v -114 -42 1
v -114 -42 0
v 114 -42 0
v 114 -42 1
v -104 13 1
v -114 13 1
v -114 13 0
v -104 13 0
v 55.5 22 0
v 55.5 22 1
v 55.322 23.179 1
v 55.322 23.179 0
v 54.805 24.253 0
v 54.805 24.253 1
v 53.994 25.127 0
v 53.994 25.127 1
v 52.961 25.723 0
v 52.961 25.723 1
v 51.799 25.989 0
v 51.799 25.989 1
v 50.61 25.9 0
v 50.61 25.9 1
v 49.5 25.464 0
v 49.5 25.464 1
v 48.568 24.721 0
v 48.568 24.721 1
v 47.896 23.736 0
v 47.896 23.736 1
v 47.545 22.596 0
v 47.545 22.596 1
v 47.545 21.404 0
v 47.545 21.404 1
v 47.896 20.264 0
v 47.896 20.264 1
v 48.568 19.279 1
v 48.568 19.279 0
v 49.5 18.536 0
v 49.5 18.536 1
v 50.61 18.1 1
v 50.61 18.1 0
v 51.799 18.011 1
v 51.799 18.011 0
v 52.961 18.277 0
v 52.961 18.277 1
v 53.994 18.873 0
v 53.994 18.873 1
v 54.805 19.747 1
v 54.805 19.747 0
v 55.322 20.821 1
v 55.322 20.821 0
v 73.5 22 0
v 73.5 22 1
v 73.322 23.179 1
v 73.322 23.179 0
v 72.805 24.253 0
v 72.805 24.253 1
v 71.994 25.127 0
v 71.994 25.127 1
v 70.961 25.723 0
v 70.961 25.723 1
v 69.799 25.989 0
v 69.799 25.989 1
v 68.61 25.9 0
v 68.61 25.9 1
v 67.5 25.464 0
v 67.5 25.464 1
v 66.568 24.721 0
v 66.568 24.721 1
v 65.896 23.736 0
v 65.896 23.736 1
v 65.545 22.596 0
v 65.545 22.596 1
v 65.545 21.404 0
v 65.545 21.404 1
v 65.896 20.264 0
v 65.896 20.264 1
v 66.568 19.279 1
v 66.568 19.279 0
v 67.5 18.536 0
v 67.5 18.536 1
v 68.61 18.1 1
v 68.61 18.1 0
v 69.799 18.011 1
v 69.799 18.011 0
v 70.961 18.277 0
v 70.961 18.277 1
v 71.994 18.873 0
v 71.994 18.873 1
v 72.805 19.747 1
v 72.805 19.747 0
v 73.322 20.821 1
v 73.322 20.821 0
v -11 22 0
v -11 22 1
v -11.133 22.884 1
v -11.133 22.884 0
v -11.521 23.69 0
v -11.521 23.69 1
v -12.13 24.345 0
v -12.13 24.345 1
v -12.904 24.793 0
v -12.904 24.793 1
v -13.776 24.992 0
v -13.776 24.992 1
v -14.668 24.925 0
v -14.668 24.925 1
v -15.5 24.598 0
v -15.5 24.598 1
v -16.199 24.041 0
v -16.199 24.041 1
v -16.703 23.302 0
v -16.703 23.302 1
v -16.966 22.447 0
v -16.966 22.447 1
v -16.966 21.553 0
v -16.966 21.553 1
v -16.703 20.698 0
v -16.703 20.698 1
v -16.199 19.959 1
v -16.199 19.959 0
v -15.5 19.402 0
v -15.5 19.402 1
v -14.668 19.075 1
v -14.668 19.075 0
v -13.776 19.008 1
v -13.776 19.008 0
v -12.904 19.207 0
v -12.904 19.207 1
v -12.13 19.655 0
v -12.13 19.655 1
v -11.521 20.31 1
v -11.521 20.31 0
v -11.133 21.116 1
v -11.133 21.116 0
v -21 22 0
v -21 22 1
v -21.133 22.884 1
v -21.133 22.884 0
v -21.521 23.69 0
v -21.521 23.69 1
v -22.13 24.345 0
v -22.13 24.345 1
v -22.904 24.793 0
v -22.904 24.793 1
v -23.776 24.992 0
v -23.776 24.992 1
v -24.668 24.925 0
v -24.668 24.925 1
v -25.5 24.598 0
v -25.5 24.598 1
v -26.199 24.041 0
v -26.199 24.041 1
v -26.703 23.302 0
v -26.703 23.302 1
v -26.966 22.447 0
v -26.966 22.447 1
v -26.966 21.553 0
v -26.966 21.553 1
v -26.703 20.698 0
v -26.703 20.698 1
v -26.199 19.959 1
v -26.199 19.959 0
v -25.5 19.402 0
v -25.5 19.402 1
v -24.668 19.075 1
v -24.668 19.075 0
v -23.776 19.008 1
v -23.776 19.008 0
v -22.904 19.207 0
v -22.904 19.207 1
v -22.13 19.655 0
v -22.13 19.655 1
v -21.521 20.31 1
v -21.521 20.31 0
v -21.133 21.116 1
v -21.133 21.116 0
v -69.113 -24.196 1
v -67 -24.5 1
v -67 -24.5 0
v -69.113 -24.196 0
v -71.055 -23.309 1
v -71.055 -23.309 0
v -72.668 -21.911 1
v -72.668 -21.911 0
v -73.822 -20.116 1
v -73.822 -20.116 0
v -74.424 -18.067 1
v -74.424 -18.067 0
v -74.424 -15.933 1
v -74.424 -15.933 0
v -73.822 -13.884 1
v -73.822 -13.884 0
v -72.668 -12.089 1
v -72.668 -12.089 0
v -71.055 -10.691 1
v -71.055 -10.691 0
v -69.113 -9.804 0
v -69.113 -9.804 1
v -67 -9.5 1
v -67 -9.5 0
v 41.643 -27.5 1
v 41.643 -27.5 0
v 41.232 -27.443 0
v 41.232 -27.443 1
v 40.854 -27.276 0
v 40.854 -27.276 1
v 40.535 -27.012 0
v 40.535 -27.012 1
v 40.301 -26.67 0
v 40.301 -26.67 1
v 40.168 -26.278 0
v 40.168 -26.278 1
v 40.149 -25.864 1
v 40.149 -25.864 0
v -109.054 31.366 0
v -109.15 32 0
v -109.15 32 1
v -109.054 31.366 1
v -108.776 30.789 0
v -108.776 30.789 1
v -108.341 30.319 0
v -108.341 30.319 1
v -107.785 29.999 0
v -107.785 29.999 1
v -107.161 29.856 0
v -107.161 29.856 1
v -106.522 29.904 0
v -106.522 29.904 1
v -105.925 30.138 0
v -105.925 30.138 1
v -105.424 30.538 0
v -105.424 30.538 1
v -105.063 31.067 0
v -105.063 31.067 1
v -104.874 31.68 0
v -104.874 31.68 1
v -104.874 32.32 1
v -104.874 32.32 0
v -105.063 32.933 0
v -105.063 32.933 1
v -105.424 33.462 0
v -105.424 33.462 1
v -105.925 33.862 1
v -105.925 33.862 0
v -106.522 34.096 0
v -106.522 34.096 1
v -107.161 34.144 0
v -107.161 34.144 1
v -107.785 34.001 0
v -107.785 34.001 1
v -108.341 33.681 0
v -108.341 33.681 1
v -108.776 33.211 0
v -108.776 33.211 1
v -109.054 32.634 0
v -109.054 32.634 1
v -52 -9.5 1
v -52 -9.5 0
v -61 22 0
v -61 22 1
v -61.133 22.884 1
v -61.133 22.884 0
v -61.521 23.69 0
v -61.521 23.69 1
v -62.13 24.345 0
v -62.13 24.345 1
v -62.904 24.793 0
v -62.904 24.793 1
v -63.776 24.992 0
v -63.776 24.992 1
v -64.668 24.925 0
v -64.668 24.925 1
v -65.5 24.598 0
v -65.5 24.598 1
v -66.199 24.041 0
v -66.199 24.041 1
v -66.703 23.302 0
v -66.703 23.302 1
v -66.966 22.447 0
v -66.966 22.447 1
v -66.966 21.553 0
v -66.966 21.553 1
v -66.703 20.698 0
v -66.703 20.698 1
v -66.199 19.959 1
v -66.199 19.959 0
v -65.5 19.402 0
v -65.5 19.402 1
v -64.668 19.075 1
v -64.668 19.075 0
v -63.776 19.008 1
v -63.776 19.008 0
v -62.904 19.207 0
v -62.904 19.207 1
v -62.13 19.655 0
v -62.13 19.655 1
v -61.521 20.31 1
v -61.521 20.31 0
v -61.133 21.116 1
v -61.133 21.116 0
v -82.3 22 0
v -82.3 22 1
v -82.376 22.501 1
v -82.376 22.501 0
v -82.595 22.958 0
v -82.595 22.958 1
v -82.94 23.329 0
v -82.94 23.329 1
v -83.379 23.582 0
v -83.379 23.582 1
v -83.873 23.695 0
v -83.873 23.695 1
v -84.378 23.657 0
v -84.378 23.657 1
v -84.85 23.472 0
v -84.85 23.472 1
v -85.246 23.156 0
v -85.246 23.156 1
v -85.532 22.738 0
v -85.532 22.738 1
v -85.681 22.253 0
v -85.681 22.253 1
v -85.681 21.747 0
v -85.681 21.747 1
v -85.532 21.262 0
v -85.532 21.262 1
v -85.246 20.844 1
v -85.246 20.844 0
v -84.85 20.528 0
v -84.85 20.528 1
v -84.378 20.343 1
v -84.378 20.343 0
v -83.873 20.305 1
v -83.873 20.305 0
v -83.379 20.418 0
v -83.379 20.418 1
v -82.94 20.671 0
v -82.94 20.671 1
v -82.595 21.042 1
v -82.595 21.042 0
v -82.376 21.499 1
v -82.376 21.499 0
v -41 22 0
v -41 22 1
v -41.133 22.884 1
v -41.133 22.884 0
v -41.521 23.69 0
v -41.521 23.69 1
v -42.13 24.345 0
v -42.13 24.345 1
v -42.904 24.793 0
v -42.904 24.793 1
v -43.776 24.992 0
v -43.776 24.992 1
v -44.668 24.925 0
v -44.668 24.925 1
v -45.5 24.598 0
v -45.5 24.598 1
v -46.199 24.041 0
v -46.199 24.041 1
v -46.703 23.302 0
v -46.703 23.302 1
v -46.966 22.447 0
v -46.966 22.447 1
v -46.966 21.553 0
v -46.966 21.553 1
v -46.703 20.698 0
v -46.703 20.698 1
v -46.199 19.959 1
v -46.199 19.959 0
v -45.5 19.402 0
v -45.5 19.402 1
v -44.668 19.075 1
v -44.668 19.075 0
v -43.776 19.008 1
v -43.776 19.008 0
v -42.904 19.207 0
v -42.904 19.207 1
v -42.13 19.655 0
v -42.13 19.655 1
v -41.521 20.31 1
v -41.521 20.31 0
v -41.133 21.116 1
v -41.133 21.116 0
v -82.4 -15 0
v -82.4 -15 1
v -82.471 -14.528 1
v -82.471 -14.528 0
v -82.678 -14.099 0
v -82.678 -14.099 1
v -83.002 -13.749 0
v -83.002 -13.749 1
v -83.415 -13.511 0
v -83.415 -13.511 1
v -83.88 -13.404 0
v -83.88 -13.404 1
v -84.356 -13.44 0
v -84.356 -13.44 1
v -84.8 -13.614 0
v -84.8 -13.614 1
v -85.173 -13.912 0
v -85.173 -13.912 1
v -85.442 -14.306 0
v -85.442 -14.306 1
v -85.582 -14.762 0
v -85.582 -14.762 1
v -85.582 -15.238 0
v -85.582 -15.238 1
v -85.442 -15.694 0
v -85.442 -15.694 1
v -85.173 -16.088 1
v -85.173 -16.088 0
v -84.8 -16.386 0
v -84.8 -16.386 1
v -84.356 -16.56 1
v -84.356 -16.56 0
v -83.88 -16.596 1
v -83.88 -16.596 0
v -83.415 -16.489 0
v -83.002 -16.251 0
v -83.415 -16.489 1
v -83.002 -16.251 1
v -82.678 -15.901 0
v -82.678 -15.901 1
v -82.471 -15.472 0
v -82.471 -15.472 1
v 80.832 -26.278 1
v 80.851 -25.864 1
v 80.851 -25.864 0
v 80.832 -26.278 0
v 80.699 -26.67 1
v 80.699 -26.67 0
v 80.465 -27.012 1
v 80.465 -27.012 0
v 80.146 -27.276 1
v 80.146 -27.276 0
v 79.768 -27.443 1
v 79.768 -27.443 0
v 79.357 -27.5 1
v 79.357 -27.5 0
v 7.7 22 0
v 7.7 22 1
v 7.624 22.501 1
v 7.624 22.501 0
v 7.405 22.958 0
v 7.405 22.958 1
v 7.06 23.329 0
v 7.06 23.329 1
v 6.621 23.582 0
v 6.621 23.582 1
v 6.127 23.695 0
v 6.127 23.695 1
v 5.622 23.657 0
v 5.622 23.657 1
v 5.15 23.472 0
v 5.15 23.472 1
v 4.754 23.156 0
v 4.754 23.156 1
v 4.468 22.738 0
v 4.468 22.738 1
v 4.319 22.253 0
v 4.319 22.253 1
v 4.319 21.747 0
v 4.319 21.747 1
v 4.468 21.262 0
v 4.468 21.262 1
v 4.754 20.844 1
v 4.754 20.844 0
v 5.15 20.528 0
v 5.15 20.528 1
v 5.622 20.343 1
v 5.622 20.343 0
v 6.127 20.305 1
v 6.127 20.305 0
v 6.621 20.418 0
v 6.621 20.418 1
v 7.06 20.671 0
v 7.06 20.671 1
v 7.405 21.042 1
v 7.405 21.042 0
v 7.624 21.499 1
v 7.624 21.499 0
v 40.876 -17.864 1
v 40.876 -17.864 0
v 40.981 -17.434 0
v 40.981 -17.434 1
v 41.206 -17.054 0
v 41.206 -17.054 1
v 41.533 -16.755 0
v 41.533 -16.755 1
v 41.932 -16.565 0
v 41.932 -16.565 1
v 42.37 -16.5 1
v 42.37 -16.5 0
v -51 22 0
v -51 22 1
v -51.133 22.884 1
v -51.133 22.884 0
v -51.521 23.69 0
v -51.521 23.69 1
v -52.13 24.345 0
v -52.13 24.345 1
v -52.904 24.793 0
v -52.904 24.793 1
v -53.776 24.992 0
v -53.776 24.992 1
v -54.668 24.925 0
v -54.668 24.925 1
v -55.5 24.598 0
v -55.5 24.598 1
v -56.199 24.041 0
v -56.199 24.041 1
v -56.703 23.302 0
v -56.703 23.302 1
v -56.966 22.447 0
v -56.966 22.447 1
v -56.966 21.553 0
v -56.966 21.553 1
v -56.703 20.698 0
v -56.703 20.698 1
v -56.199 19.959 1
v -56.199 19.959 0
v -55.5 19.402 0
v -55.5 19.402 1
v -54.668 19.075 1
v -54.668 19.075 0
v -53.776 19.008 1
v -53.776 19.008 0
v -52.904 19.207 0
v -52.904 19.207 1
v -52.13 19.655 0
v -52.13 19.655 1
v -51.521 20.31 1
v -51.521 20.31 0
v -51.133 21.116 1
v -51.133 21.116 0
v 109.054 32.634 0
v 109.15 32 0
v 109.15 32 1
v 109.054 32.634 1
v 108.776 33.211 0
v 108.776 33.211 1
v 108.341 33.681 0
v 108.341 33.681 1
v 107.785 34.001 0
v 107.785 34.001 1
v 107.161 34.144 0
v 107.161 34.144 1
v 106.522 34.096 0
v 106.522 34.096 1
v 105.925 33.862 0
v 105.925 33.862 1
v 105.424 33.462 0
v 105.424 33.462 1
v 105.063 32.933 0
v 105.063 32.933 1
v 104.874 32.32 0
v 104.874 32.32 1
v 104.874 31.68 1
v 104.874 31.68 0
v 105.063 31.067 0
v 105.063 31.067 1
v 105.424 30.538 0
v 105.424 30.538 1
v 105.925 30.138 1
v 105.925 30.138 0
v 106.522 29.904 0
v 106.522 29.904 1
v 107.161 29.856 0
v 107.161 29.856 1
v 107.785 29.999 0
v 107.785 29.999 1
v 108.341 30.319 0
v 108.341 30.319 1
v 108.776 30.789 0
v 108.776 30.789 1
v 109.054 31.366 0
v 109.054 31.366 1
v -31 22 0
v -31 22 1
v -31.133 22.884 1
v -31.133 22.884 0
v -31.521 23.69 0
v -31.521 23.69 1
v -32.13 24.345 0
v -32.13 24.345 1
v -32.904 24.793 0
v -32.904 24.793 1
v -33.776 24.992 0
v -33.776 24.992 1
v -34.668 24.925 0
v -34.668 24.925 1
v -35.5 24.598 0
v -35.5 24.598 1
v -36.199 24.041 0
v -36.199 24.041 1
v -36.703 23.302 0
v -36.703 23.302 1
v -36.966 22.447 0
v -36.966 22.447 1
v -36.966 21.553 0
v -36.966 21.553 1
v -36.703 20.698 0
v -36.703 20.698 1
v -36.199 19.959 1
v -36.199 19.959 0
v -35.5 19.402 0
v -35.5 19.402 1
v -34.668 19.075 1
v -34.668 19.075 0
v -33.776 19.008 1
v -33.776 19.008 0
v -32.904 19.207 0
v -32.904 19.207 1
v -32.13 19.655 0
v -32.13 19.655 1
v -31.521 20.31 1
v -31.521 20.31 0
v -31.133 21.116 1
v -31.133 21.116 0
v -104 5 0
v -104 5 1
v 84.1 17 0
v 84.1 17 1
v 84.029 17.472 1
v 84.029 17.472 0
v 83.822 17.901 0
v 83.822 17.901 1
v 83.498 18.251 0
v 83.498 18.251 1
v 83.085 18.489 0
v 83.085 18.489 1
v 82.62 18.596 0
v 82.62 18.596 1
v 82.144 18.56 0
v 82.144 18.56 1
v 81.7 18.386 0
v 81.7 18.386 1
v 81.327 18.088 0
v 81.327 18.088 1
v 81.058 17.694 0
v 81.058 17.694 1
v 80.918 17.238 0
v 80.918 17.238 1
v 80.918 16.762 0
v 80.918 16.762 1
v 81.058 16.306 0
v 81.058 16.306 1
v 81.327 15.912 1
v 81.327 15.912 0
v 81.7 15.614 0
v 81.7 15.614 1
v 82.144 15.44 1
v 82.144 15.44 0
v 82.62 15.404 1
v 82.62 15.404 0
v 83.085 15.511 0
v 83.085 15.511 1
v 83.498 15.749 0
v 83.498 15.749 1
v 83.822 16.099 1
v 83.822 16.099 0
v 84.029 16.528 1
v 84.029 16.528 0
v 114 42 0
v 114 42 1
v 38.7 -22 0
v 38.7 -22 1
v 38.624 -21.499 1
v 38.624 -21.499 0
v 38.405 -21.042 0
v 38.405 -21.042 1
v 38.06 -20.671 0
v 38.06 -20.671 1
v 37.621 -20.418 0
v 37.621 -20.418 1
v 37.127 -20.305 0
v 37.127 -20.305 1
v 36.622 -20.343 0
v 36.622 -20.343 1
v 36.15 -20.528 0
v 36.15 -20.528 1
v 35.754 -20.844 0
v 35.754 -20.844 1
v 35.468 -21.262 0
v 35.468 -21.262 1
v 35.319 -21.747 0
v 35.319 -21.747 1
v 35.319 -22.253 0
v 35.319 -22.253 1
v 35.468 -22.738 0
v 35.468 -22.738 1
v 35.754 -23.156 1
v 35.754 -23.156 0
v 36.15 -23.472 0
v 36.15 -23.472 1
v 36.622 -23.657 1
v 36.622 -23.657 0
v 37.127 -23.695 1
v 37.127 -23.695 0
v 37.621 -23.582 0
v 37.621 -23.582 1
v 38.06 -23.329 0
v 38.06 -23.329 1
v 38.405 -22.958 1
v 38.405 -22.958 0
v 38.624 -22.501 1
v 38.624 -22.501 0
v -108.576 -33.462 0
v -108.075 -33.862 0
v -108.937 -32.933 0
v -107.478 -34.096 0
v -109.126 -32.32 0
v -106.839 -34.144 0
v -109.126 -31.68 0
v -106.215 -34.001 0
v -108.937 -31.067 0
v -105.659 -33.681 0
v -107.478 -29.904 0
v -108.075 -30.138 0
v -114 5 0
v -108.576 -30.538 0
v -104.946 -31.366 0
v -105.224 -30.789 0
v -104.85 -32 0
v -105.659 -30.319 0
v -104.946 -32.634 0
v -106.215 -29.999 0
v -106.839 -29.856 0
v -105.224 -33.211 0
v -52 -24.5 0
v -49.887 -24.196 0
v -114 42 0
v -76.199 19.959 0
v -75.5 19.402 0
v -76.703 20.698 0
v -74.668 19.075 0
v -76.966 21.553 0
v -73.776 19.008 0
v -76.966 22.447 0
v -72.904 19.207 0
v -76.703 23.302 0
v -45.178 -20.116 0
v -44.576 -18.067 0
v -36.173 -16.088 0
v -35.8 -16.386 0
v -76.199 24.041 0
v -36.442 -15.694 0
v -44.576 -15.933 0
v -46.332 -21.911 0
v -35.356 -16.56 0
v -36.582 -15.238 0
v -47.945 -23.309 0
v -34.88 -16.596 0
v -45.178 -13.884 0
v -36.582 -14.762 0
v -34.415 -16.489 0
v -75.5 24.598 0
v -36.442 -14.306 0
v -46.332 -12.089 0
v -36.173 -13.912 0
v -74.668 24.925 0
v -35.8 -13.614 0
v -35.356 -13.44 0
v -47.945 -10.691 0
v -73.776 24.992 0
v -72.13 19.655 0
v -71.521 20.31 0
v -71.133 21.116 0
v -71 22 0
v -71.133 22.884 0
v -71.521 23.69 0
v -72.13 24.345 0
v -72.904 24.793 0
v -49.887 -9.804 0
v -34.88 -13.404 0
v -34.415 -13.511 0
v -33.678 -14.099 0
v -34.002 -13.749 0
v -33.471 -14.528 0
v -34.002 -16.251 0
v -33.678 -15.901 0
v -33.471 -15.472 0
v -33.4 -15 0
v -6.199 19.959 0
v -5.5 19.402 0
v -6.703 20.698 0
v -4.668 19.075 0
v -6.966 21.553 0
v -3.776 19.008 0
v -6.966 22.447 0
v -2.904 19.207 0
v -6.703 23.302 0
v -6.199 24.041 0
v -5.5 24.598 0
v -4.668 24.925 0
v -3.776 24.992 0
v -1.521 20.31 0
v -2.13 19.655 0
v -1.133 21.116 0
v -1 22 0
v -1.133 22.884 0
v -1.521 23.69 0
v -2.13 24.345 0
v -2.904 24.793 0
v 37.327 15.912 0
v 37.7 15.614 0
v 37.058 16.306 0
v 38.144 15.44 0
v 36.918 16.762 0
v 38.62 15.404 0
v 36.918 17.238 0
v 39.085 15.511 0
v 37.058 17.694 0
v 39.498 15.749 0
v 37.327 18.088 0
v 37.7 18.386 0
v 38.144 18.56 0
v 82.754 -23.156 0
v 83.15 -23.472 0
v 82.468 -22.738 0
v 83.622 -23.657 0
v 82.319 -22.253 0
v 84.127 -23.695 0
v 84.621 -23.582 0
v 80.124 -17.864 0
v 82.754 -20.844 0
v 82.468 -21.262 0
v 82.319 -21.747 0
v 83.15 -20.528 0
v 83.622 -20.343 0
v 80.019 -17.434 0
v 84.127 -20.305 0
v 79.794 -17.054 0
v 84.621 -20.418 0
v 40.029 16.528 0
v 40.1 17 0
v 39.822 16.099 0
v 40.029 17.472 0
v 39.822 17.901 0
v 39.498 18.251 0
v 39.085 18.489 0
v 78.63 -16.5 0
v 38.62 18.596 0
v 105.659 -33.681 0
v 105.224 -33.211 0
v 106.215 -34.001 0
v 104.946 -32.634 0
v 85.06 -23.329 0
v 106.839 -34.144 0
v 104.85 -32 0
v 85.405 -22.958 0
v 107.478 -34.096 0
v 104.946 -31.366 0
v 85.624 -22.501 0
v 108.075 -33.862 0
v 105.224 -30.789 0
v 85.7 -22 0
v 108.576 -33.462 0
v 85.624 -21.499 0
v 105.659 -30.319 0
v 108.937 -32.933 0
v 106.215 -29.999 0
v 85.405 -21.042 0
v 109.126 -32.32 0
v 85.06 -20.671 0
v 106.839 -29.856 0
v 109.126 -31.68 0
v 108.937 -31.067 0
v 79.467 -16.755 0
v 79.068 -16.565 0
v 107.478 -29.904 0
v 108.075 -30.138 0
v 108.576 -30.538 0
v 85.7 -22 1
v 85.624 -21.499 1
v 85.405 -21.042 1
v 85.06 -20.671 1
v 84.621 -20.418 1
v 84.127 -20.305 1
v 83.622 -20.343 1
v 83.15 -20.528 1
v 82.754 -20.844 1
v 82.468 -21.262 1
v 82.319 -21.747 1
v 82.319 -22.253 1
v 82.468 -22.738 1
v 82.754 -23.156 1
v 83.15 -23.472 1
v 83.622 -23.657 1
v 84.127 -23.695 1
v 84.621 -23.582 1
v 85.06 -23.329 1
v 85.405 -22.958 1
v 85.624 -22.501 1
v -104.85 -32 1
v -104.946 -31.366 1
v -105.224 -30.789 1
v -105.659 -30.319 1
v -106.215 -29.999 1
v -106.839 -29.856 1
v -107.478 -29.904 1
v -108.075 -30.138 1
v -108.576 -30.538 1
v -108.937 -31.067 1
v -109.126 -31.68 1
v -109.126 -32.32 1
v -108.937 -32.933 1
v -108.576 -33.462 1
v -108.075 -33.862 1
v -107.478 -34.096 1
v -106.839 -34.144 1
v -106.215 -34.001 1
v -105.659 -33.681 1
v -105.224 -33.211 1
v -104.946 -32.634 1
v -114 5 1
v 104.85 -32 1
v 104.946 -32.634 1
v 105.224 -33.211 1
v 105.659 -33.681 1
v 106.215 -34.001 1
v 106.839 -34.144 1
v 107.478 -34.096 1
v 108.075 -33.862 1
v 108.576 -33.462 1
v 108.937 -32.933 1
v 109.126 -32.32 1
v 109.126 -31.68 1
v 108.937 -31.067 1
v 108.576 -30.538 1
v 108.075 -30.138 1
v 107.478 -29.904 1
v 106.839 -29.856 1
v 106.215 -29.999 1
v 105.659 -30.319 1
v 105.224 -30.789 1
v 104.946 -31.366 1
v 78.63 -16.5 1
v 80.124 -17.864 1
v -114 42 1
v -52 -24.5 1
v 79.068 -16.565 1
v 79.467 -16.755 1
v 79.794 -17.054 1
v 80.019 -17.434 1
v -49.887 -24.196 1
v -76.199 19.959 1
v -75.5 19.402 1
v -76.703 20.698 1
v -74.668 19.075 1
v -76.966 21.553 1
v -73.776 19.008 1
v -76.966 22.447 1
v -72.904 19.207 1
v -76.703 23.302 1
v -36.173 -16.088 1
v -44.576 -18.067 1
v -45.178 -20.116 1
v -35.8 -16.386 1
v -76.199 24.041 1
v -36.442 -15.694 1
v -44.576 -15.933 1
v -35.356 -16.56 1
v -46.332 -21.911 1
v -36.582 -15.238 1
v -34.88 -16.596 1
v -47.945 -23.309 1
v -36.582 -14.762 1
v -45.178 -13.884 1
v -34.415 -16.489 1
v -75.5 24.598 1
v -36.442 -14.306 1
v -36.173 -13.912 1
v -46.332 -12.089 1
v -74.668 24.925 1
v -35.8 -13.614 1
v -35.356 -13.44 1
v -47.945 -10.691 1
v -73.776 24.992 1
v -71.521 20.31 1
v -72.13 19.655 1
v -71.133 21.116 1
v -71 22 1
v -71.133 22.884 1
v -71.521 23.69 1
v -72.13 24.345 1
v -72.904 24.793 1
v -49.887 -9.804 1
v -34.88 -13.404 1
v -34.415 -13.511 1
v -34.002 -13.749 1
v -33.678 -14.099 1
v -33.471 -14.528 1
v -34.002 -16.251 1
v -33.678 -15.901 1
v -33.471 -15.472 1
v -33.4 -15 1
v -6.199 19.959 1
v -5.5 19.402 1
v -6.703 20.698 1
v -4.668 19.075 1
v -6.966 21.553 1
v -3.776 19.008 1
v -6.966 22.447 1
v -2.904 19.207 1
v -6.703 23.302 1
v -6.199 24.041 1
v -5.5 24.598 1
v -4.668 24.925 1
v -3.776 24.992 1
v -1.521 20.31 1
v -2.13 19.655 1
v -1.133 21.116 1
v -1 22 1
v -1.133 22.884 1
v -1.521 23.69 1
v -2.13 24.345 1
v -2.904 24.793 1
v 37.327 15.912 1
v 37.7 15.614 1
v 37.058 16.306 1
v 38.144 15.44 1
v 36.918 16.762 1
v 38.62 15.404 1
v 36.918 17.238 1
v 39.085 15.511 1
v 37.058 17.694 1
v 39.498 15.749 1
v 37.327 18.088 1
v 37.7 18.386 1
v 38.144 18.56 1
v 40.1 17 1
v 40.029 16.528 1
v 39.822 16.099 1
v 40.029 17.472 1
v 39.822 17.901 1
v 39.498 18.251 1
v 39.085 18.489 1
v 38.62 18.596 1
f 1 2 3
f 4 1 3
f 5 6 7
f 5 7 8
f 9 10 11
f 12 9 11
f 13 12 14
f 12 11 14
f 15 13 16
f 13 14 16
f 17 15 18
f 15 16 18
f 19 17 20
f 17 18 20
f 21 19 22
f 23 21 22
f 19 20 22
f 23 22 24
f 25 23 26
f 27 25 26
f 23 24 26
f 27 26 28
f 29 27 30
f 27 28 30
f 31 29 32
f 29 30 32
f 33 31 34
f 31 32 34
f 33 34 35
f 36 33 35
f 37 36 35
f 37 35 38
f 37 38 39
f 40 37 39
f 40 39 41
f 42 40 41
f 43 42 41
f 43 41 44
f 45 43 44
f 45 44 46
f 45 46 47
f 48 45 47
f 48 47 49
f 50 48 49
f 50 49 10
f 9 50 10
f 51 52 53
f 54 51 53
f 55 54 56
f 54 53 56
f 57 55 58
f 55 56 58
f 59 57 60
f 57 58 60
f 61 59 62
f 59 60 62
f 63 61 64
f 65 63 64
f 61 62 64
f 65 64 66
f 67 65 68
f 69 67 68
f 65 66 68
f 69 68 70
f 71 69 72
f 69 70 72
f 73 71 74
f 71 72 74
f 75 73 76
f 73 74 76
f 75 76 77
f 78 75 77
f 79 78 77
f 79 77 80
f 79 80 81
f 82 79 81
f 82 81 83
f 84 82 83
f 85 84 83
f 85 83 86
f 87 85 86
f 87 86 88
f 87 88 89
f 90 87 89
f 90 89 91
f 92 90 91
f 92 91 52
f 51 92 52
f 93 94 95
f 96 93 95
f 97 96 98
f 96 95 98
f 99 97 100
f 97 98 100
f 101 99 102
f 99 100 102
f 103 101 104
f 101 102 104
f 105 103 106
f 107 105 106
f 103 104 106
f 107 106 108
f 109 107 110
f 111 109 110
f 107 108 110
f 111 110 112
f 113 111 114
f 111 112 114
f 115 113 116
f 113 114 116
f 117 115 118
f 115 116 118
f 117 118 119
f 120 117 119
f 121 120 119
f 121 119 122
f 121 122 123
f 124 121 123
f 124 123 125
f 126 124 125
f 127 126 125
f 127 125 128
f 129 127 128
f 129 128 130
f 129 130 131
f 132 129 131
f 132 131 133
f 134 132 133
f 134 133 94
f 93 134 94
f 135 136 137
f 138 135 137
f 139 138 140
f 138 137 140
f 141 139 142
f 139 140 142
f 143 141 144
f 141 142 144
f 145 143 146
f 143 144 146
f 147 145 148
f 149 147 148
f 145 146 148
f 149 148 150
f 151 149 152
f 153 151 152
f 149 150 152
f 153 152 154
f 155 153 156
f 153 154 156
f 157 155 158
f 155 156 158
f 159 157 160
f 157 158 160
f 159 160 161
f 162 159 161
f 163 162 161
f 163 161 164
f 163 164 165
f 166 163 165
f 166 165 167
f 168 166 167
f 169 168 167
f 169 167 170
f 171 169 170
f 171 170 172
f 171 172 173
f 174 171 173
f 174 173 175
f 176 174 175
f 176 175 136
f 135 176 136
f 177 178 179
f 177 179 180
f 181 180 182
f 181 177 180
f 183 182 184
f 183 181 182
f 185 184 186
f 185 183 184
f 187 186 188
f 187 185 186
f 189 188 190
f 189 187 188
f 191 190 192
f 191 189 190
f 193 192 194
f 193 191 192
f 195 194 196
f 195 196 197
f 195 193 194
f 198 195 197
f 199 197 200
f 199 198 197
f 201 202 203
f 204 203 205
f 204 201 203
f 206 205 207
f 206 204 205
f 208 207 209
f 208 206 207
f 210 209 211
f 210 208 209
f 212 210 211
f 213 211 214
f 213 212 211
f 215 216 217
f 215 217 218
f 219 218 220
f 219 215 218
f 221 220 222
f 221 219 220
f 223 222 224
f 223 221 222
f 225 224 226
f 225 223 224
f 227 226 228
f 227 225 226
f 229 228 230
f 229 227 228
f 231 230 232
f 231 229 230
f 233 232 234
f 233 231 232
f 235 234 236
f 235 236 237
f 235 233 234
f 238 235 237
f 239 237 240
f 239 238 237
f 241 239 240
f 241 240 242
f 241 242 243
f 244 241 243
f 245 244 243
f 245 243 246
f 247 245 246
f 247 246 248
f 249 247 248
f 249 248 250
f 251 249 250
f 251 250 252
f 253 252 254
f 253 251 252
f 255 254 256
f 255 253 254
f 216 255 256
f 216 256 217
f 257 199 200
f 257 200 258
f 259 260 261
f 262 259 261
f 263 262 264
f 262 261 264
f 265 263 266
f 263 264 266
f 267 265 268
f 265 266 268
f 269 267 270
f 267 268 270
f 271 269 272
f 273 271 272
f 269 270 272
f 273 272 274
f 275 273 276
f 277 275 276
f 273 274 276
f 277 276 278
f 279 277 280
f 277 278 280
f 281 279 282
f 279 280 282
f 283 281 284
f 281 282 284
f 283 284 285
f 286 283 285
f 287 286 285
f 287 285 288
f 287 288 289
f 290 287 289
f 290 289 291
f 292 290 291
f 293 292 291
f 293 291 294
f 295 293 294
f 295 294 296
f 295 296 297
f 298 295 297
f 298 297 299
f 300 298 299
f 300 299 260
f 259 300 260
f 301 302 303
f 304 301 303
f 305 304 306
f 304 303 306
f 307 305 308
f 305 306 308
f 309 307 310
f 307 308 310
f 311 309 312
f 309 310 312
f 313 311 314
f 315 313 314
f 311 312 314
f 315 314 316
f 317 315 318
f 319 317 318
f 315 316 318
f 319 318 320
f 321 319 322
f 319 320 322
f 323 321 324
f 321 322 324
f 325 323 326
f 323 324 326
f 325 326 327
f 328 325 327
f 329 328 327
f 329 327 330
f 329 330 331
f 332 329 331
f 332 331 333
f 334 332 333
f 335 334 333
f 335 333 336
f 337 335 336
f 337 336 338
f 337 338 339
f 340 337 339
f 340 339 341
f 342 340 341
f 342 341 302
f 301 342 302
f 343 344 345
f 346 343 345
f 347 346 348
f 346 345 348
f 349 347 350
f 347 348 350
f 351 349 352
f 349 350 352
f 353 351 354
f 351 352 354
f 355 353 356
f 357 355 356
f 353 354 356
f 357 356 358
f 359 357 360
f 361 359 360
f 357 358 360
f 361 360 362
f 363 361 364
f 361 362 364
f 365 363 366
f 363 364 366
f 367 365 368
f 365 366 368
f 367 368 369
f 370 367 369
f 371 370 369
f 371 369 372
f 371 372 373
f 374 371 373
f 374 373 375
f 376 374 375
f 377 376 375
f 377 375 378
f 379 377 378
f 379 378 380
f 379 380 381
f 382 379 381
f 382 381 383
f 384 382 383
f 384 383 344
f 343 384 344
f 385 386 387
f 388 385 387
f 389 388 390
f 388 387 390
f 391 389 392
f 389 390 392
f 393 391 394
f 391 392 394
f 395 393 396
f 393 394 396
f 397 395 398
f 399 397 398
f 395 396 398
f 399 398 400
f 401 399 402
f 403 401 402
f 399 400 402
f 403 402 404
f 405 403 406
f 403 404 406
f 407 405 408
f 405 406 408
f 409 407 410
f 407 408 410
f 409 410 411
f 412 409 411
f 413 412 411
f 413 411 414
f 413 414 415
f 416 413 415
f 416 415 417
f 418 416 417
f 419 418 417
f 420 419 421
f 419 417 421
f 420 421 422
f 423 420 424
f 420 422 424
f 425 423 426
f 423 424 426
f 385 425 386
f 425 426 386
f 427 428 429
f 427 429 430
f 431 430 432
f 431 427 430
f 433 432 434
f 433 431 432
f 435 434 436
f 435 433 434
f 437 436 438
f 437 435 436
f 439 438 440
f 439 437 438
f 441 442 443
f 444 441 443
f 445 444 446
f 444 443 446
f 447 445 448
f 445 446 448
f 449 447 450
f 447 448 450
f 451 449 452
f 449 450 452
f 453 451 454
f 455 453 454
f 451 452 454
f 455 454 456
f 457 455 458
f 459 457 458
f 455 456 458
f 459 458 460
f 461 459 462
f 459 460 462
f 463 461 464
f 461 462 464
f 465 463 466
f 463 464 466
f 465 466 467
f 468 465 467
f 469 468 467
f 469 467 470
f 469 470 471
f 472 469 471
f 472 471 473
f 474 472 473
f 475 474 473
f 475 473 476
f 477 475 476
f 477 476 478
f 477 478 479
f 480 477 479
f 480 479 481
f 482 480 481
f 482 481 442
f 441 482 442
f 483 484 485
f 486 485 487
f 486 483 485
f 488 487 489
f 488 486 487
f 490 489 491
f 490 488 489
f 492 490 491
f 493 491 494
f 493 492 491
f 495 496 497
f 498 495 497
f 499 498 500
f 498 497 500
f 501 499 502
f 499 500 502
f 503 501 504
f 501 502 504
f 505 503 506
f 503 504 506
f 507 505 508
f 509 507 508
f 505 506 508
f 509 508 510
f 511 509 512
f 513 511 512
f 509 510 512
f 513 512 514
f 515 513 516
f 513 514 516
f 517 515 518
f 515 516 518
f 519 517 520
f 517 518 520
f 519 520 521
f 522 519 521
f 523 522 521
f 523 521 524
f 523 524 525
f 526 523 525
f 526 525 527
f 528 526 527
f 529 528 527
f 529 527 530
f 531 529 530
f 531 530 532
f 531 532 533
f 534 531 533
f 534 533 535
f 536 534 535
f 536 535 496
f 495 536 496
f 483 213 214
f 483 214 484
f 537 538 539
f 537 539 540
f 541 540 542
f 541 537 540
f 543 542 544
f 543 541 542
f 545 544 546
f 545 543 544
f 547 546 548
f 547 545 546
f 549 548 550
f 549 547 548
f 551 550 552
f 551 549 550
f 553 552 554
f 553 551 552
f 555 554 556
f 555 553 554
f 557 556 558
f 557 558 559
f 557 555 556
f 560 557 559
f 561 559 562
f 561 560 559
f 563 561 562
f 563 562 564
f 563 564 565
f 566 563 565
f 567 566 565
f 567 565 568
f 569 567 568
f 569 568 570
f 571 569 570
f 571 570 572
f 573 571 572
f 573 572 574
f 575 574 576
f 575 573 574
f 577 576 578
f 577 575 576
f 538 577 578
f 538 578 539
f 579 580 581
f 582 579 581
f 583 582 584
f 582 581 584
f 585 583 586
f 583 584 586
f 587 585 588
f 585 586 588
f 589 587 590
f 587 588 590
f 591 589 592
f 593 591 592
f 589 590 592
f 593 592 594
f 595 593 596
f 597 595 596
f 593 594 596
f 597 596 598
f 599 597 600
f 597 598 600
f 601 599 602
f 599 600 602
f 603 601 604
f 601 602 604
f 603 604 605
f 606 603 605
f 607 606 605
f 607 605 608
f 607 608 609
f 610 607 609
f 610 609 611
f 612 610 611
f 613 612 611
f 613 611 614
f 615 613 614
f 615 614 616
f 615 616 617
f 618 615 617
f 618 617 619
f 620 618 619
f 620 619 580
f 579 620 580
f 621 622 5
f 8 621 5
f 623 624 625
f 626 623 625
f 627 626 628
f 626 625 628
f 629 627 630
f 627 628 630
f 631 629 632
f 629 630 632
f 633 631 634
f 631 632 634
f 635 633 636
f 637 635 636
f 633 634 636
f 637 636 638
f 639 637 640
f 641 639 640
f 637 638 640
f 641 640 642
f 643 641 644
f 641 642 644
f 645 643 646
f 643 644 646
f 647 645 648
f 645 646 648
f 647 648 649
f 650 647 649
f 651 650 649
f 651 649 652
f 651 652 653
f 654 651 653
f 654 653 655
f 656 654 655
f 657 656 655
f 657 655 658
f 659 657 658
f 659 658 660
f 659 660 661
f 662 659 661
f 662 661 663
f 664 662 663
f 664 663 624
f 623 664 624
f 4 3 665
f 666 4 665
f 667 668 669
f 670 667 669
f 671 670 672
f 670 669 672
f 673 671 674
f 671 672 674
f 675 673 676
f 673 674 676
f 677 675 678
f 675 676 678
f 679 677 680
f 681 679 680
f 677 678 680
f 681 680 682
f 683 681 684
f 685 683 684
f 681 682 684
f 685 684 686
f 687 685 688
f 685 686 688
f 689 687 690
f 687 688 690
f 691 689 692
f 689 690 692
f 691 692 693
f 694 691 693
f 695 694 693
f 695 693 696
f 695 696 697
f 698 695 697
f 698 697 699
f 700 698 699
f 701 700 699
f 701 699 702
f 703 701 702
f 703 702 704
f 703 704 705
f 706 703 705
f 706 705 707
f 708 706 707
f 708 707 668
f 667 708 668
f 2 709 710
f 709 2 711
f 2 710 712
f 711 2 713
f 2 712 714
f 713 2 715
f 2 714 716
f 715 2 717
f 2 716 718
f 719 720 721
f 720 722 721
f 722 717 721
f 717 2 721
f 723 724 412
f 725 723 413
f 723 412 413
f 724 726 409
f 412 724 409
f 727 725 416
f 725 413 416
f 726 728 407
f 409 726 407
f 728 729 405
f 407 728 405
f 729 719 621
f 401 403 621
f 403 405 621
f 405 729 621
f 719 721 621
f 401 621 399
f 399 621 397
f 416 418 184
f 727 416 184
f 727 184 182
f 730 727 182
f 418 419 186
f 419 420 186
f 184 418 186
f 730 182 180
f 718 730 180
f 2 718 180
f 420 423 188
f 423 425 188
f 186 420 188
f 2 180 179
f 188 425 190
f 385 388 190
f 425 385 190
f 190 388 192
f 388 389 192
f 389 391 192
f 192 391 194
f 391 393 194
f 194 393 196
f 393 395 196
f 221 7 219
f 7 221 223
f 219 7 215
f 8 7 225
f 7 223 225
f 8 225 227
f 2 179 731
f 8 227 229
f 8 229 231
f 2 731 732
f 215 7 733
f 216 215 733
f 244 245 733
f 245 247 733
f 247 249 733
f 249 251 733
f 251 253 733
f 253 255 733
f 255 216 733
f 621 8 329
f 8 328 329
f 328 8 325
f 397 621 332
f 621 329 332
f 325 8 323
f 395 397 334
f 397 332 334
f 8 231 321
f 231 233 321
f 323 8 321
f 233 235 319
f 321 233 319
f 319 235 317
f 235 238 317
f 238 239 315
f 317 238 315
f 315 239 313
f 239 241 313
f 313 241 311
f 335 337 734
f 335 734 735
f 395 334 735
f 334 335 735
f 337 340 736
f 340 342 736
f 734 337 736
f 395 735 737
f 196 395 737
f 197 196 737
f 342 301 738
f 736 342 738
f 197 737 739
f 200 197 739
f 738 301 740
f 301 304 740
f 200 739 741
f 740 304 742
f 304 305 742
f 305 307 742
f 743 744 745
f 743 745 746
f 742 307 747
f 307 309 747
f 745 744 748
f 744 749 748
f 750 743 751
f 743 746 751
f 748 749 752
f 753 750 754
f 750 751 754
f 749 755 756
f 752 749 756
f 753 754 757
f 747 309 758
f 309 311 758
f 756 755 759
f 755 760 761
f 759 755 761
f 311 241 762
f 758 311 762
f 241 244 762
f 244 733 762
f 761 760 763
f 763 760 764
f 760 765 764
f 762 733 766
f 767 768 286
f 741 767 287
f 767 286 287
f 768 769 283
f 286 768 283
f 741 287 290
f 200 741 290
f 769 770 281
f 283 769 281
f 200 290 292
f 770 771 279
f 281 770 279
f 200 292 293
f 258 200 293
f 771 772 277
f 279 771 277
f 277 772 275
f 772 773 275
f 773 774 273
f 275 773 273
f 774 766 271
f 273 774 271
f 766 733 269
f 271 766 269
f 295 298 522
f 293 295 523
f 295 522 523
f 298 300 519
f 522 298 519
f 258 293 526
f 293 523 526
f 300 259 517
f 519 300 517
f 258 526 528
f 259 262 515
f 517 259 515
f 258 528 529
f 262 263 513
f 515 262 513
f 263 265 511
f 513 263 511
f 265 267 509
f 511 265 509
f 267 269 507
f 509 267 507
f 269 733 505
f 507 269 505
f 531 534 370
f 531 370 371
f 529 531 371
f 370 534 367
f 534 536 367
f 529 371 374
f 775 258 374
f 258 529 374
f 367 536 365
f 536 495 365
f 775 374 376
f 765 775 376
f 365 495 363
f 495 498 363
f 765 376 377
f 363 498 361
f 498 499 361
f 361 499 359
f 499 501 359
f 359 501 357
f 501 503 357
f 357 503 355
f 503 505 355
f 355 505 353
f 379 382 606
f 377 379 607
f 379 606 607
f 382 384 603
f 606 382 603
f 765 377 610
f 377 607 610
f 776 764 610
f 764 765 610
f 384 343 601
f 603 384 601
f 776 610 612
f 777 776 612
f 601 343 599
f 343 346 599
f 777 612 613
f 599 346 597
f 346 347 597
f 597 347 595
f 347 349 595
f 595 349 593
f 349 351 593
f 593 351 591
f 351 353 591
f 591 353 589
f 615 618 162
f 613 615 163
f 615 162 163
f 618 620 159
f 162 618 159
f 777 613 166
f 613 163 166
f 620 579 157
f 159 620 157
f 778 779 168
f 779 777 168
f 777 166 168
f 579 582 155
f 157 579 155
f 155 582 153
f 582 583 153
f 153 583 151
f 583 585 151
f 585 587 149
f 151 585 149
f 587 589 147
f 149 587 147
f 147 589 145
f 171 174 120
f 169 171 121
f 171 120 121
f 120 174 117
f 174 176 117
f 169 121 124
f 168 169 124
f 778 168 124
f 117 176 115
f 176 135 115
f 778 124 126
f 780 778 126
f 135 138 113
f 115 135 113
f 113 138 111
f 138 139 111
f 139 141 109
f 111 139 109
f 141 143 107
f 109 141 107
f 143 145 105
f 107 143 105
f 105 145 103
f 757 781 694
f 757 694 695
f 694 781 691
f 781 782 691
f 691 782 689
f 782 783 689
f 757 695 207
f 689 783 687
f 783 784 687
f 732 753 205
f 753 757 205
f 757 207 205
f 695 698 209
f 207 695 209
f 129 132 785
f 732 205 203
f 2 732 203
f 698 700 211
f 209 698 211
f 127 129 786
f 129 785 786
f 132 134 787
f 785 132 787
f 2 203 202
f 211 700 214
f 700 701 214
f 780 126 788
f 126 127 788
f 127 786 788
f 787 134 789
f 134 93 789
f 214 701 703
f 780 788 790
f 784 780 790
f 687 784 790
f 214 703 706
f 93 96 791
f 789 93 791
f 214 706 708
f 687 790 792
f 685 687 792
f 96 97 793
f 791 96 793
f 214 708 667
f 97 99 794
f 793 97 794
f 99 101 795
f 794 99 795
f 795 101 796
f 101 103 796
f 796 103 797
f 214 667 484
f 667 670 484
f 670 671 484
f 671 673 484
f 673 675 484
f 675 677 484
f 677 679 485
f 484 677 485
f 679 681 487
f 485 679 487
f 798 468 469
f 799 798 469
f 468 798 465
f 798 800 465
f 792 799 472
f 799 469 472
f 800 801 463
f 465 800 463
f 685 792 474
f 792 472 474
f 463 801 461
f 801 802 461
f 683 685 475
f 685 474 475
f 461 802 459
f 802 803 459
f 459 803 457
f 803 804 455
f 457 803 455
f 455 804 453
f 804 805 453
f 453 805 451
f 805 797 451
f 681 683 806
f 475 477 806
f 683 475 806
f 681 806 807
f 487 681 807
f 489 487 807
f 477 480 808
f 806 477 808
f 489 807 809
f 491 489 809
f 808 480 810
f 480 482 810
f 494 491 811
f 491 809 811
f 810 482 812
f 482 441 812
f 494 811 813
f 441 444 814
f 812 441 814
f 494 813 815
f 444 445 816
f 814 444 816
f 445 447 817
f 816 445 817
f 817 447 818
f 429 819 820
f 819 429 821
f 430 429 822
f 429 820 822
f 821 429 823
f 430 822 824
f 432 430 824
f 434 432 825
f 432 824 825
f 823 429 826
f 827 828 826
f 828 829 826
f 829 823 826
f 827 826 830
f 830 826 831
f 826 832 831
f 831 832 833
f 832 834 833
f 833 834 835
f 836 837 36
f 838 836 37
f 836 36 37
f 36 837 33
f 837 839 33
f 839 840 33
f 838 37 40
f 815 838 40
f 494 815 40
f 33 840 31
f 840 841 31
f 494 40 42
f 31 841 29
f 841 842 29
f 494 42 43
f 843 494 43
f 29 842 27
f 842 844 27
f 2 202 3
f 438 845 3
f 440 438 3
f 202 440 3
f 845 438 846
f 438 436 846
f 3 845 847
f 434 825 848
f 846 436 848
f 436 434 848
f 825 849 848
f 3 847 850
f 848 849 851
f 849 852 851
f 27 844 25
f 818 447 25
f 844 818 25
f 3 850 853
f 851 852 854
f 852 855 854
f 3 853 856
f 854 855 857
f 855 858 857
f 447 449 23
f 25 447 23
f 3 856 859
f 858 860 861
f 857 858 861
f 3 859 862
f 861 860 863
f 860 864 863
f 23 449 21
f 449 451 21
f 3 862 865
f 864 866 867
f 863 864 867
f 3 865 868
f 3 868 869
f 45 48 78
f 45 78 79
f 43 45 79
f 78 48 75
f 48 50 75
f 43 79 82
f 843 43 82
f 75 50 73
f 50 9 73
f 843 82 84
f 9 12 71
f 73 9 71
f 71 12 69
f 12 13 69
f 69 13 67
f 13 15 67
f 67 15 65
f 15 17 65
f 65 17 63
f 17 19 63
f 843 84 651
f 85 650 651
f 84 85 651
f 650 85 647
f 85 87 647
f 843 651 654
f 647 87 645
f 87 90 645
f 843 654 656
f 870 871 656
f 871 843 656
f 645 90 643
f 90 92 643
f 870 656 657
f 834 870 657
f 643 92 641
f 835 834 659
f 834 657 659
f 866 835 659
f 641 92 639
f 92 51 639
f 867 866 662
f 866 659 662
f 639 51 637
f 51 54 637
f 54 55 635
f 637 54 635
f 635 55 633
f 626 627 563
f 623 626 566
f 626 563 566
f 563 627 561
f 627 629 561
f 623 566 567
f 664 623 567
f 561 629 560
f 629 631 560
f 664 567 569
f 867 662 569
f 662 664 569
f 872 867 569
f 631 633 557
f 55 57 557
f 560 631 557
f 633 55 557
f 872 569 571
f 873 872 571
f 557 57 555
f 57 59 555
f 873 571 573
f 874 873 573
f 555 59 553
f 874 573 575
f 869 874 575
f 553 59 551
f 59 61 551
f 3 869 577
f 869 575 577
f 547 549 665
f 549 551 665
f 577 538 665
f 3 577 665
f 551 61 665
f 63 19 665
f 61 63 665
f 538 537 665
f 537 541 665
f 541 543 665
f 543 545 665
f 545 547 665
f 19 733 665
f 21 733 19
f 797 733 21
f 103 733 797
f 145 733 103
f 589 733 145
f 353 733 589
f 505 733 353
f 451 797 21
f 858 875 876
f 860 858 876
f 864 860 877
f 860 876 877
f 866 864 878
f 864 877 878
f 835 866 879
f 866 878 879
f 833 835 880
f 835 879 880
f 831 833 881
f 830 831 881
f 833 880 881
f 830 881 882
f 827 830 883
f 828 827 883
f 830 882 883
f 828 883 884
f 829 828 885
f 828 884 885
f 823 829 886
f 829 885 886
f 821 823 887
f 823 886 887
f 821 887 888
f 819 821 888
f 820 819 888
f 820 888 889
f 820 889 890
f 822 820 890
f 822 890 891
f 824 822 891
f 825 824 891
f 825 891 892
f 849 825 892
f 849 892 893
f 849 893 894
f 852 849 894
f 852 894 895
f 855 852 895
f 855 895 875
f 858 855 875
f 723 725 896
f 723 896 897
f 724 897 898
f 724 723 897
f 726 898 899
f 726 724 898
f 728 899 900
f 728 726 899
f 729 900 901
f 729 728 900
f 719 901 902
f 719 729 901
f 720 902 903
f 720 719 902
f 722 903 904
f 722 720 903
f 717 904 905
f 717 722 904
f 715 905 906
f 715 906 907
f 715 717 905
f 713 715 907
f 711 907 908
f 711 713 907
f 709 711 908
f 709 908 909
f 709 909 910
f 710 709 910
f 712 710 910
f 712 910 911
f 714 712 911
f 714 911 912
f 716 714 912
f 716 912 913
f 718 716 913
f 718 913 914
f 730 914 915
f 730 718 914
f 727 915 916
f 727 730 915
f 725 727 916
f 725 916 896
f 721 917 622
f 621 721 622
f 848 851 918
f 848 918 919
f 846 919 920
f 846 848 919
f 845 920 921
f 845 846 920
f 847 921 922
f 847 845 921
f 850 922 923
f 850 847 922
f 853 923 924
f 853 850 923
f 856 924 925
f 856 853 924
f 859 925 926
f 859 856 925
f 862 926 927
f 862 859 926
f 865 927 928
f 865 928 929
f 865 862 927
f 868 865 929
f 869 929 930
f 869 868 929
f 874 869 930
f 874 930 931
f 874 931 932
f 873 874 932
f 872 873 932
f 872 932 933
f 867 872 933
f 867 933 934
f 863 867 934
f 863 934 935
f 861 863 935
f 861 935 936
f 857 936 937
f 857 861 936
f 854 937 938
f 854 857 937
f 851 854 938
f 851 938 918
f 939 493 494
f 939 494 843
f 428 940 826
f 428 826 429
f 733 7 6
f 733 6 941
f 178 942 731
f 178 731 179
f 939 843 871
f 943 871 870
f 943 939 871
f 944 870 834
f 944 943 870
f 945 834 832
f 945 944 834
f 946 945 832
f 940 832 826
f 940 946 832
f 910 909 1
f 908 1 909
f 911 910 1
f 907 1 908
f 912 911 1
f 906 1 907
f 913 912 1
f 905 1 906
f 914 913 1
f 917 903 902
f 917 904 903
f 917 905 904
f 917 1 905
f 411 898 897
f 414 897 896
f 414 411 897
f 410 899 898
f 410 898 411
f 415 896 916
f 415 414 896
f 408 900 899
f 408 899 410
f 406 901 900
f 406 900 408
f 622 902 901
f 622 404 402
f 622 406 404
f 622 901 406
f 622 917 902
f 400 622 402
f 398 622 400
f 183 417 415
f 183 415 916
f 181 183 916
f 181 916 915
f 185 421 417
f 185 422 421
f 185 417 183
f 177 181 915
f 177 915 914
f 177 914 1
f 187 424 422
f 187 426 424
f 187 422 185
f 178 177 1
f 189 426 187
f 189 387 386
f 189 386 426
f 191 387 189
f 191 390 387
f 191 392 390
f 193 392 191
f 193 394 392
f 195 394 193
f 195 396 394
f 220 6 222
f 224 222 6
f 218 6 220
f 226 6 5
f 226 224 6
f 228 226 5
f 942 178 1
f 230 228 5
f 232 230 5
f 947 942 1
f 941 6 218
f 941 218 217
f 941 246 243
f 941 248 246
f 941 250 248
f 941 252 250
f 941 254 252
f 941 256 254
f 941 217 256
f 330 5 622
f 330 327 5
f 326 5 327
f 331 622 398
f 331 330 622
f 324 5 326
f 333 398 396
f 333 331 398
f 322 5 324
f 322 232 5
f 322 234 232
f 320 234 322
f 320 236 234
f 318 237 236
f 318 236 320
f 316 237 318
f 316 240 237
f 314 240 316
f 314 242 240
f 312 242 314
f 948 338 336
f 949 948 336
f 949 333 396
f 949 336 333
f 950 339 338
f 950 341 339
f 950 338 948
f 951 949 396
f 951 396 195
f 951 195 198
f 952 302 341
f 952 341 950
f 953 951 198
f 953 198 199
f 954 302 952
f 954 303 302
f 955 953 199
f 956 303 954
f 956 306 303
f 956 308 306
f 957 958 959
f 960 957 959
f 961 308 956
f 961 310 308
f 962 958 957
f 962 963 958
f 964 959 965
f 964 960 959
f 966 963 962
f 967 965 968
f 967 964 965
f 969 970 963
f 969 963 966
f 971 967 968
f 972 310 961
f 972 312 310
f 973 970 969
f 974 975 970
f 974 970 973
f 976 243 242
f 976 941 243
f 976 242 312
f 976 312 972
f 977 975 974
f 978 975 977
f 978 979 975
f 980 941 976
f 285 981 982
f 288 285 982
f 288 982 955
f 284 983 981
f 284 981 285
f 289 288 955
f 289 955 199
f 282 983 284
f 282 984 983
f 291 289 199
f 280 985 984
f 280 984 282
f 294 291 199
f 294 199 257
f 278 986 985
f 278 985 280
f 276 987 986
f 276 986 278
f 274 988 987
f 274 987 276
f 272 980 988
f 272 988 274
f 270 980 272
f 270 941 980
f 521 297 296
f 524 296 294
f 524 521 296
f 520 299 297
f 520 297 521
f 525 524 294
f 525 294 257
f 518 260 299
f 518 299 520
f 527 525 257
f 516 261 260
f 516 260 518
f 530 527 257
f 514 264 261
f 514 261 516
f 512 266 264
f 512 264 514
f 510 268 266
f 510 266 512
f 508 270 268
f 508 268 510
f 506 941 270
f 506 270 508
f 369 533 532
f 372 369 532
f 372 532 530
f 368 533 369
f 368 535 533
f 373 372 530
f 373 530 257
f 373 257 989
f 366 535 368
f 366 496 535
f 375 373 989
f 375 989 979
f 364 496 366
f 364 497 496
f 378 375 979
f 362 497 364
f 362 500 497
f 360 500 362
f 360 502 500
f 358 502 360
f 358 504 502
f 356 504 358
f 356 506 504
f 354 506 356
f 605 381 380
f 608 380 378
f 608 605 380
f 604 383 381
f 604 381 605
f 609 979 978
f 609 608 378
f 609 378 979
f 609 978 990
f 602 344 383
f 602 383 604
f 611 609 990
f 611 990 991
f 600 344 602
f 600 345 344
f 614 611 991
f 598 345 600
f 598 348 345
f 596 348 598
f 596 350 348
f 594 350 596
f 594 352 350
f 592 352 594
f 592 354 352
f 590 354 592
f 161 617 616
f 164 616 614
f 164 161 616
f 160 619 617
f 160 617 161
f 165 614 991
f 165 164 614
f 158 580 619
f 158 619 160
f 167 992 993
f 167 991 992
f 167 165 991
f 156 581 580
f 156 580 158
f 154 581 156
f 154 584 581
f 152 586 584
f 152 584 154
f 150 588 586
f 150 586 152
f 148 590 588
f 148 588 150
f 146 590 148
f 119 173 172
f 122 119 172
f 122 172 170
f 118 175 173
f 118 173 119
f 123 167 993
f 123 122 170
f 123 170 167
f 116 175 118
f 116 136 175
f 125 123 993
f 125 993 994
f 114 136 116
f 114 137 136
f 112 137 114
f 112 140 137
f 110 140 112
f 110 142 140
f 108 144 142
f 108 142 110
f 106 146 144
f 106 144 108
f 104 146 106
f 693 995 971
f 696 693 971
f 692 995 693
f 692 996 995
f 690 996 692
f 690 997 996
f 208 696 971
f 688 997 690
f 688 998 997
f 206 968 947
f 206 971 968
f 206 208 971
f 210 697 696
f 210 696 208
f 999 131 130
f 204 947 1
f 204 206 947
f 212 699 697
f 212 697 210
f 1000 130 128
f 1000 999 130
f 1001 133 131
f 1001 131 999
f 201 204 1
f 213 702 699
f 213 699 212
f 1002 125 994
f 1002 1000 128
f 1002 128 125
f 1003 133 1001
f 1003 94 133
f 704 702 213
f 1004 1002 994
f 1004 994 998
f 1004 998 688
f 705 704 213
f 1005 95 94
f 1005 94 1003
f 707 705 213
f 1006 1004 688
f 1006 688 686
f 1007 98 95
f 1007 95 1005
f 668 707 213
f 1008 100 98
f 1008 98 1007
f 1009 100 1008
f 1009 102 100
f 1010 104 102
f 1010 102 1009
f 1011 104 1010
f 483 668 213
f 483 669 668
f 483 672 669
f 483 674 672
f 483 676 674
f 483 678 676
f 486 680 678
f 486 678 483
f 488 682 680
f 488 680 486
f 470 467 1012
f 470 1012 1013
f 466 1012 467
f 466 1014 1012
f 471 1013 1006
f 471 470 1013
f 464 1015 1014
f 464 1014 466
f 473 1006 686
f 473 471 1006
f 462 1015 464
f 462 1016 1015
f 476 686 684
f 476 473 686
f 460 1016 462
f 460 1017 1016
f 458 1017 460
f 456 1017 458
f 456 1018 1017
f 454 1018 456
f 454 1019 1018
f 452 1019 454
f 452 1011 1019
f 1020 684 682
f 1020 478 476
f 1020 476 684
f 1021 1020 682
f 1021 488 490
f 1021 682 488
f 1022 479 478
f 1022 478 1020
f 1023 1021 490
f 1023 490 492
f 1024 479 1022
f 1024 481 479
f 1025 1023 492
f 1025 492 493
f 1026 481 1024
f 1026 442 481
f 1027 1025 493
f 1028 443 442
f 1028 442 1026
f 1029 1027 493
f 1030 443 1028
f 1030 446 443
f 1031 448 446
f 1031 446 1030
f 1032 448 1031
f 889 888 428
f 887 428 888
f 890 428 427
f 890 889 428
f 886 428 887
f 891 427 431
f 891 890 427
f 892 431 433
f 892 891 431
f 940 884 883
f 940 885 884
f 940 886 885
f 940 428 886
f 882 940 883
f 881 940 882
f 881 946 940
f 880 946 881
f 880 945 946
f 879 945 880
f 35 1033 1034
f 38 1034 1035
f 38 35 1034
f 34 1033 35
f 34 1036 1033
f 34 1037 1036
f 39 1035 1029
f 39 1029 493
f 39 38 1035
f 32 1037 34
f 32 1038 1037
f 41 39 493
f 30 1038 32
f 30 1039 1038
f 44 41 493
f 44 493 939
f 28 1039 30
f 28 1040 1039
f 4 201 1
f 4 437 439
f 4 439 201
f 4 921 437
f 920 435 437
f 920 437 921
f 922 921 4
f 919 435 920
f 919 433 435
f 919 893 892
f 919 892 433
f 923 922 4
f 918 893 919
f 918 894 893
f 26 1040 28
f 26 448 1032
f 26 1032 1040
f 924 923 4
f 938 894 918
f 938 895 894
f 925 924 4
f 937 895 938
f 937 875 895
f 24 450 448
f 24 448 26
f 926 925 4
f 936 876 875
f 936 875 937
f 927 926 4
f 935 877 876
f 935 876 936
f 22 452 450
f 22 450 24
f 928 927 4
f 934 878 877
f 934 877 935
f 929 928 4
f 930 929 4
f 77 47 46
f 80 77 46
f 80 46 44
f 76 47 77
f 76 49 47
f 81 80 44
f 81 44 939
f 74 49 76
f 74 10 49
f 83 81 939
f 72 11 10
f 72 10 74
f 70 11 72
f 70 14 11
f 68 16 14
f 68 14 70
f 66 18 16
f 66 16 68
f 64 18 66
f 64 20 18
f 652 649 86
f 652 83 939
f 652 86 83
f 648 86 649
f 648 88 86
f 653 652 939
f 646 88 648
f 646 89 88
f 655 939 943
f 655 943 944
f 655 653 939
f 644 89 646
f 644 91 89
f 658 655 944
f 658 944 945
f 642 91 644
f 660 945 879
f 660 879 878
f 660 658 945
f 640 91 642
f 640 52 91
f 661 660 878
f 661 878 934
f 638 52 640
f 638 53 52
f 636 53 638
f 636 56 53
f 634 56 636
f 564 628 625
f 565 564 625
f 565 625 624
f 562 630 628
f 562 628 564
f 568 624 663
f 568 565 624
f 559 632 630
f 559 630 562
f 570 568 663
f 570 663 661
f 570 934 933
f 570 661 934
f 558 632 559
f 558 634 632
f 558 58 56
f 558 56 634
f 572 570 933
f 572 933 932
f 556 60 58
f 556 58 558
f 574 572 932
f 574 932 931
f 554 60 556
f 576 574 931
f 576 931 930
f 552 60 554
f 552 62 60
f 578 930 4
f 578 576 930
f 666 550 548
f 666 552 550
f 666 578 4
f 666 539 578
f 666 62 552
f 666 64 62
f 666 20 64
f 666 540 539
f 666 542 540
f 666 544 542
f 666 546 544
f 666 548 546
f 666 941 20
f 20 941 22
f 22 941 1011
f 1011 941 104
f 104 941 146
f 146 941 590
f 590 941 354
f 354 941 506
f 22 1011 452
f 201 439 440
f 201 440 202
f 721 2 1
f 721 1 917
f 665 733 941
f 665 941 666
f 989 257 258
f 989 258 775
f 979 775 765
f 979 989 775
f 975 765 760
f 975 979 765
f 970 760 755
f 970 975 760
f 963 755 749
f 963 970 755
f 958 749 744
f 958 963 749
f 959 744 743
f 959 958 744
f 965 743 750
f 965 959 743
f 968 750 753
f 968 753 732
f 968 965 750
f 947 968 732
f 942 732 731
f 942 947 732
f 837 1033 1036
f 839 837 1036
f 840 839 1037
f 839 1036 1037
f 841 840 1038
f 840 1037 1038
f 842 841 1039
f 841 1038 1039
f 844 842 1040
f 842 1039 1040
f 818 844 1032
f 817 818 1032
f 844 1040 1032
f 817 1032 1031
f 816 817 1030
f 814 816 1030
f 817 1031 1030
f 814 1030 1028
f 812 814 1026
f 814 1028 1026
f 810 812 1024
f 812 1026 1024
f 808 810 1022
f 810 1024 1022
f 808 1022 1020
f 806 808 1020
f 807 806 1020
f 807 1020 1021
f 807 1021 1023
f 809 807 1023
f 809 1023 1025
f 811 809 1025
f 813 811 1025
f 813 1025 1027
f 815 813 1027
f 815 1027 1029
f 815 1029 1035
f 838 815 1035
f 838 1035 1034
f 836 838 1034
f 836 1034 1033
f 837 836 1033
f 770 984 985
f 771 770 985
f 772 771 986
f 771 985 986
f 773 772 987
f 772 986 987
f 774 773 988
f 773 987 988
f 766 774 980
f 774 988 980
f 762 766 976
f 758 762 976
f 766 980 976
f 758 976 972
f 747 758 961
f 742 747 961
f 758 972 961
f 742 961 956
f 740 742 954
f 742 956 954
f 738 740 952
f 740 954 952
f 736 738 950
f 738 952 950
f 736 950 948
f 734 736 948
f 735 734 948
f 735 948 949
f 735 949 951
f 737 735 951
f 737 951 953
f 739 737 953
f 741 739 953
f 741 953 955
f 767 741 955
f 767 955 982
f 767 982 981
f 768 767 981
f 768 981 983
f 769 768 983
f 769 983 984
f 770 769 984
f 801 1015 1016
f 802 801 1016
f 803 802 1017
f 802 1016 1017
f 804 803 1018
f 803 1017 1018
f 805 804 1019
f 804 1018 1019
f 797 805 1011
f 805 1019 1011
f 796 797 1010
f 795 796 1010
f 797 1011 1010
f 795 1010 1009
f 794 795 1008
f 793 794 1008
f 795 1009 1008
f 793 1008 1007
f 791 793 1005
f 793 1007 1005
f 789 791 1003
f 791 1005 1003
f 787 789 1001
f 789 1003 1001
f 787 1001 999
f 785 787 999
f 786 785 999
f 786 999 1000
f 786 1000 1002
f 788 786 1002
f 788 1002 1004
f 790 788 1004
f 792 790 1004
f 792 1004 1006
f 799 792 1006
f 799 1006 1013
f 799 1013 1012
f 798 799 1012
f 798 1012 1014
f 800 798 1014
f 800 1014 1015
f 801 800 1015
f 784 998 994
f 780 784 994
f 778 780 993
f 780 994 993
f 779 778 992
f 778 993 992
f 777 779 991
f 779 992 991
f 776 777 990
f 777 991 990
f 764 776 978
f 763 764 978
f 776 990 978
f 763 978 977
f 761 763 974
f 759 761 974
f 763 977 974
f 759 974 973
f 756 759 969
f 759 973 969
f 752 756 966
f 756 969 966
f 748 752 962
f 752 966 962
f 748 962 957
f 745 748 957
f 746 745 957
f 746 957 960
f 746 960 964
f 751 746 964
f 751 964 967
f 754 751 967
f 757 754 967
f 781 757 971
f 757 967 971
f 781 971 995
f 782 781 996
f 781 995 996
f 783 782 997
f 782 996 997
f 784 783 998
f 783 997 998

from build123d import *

# Parameters (mm, degrees)
SKETCH_1_W          = 228
SKETCH_1_H          = 84
SKETCH_1_R          = 2.15
EXTRUDE_1_DEPTH     = 1
SKETCH_3_R          = 1.7
SKETCH_3_R_2        = 1.6
SKETCH_3_R_3        = 4
CUT_EXTRUDE_1_DEPTH = 10
SKETCH_4_R          = 1.6
SKETCH_4_W          = 16.398551469
SKETCH_4_H          = 8
CUT_EXTRUDE_2_DEPTH = 1
SKETCH_5_R          = 1.7
SKETCH_5_R_2        = 3
CUT_EXTRUDE_3_DEPTH = 10


with BuildPart() as part:
    # Эскиз1 → Вытянуть1 (new body)
    with BuildSketch(Plane.XY):
        Rectangle(SKETCH_1_W, SKETCH_1_H)
        with Locations((107, 32)):
            Circle(SKETCH_1_R, mode=Mode.SUBTRACT)
        with Locations(Location((-107, 32, 0), (0, 0, 180))):
            Circle(SKETCH_1_R, mode=Mode.SUBTRACT)
        with Locations((-107, -32)):
            Circle(SKETCH_1_R, mode=Mode.SUBTRACT)
        with Locations(Location((107, -32, 0), (0, 0, 180))):
            Circle(SKETCH_1_R, mode=Mode.SUBTRACT)
    extrude(amount=EXTRUDE_1_DEPTH)

    # Эскиз3 → Вырез-Вытянуть1 (cut)
    with BuildSketch(Plane.XY.offset(1)):
        with Locations((37, -22)):
            Circle(SKETCH_3_R)
        with Locations((84, -22)):
            Circle(SKETCH_3_R)
        with Locations((38.5, 17)):
            Circle(SKETCH_3_R_2)
        with Locations((82.5, 17)):
            Circle(SKETCH_3_R_2)
        with Locations((51.5, 22)):
            Circle(SKETCH_3_R_3)
        with Locations((69.5, 22)):
            Circle(SKETCH_3_R_3)
        with BuildLine():
            Line((40.14870942, -25.864196381), (40.875982147, -17.864196381))
            ThreePointArc((40.875982147, -17.864196381), (41.358314525, -16.892366164), (42.369821957, -16.5))
            Line((42.369821957, -16.5), (78.630178043, -16.5))
            ThreePointArc((78.630178043, -16.5), (79.641685475, -16.892366164), (80.124017853, -17.864196381))
            Line((80.124017853, -17.864196381), (80.85129058, -25.864196381))
            ThreePointArc((80.85129058, -25.864196381), (80.465084606, -27.011507432), (79.35745077, -27.5))
            Line((79.35745077, -27.5), (41.64254923, -27.5))
            ThreePointArc((41.64254923, -27.5), (40.534915394, -27.011507432), (40.14870942, -25.864196381))
        make_face()
    extrude(amount=-CUT_EXTRUDE_1_DEPTH, mode=Mode.SUBTRACT)

    # Эскиз4 → Вырез-Вытянуть2 (cut)
    with BuildSketch(Plane.XY.offset(1)):
        with Locations((-84, -15)):
            Circle(SKETCH_4_R)
        with Locations((-35, -15)):
            Circle(SKETCH_4_R)
        with BuildLine():
            Line((-67, -9.5), (-52, -9.5))
            ThreePointArc((-52, -9.5), (-44.5, -17), (-52, -24.5))
            Line((-52, -24.5), (-67, -24.5))
            ThreePointArc((-67, -24.5), (-74.5, -17), (-67, -9.5))
        make_face()
        with Locations((-112.199275735, 9)):
            Rectangle(SKETCH_4_W, SKETCH_4_H)
    extrude(amount=-CUT_EXTRUDE_2_DEPTH, mode=Mode.SUBTRACT)

    # Эскиз5 → Вырез-Вытянуть3 (cut)
    with BuildSketch(Plane.XY.offset(1)):
        with Locations((-84, 22)):
            Circle(SKETCH_5_R)
        with Locations((6, 22)):
            Circle(SKETCH_5_R)
        with Locations((-4, 22)):
            Circle(SKETCH_5_R_2)
        with Locations((-14, 22)):
            Circle(SKETCH_5_R_2)
        with Locations((-24, 22)):
            Circle(SKETCH_5_R_2)
        with Locations((-34, 22)):
            Circle(SKETCH_5_R_2)
        with Locations((-44, 22)):
            Circle(SKETCH_5_R_2)
        with Locations((-54, 22)):
            Circle(SKETCH_5_R_2)
        with Locations((-64, 22)):
            Circle(SKETCH_5_R_2)
        with Locations((-74, 22)):
            Circle(SKETCH_5_R_2)
    extrude(amount=-CUT_EXTRUDE_3_DEPTH, mode=Mode.SUBTRACT)


solid = part.part
